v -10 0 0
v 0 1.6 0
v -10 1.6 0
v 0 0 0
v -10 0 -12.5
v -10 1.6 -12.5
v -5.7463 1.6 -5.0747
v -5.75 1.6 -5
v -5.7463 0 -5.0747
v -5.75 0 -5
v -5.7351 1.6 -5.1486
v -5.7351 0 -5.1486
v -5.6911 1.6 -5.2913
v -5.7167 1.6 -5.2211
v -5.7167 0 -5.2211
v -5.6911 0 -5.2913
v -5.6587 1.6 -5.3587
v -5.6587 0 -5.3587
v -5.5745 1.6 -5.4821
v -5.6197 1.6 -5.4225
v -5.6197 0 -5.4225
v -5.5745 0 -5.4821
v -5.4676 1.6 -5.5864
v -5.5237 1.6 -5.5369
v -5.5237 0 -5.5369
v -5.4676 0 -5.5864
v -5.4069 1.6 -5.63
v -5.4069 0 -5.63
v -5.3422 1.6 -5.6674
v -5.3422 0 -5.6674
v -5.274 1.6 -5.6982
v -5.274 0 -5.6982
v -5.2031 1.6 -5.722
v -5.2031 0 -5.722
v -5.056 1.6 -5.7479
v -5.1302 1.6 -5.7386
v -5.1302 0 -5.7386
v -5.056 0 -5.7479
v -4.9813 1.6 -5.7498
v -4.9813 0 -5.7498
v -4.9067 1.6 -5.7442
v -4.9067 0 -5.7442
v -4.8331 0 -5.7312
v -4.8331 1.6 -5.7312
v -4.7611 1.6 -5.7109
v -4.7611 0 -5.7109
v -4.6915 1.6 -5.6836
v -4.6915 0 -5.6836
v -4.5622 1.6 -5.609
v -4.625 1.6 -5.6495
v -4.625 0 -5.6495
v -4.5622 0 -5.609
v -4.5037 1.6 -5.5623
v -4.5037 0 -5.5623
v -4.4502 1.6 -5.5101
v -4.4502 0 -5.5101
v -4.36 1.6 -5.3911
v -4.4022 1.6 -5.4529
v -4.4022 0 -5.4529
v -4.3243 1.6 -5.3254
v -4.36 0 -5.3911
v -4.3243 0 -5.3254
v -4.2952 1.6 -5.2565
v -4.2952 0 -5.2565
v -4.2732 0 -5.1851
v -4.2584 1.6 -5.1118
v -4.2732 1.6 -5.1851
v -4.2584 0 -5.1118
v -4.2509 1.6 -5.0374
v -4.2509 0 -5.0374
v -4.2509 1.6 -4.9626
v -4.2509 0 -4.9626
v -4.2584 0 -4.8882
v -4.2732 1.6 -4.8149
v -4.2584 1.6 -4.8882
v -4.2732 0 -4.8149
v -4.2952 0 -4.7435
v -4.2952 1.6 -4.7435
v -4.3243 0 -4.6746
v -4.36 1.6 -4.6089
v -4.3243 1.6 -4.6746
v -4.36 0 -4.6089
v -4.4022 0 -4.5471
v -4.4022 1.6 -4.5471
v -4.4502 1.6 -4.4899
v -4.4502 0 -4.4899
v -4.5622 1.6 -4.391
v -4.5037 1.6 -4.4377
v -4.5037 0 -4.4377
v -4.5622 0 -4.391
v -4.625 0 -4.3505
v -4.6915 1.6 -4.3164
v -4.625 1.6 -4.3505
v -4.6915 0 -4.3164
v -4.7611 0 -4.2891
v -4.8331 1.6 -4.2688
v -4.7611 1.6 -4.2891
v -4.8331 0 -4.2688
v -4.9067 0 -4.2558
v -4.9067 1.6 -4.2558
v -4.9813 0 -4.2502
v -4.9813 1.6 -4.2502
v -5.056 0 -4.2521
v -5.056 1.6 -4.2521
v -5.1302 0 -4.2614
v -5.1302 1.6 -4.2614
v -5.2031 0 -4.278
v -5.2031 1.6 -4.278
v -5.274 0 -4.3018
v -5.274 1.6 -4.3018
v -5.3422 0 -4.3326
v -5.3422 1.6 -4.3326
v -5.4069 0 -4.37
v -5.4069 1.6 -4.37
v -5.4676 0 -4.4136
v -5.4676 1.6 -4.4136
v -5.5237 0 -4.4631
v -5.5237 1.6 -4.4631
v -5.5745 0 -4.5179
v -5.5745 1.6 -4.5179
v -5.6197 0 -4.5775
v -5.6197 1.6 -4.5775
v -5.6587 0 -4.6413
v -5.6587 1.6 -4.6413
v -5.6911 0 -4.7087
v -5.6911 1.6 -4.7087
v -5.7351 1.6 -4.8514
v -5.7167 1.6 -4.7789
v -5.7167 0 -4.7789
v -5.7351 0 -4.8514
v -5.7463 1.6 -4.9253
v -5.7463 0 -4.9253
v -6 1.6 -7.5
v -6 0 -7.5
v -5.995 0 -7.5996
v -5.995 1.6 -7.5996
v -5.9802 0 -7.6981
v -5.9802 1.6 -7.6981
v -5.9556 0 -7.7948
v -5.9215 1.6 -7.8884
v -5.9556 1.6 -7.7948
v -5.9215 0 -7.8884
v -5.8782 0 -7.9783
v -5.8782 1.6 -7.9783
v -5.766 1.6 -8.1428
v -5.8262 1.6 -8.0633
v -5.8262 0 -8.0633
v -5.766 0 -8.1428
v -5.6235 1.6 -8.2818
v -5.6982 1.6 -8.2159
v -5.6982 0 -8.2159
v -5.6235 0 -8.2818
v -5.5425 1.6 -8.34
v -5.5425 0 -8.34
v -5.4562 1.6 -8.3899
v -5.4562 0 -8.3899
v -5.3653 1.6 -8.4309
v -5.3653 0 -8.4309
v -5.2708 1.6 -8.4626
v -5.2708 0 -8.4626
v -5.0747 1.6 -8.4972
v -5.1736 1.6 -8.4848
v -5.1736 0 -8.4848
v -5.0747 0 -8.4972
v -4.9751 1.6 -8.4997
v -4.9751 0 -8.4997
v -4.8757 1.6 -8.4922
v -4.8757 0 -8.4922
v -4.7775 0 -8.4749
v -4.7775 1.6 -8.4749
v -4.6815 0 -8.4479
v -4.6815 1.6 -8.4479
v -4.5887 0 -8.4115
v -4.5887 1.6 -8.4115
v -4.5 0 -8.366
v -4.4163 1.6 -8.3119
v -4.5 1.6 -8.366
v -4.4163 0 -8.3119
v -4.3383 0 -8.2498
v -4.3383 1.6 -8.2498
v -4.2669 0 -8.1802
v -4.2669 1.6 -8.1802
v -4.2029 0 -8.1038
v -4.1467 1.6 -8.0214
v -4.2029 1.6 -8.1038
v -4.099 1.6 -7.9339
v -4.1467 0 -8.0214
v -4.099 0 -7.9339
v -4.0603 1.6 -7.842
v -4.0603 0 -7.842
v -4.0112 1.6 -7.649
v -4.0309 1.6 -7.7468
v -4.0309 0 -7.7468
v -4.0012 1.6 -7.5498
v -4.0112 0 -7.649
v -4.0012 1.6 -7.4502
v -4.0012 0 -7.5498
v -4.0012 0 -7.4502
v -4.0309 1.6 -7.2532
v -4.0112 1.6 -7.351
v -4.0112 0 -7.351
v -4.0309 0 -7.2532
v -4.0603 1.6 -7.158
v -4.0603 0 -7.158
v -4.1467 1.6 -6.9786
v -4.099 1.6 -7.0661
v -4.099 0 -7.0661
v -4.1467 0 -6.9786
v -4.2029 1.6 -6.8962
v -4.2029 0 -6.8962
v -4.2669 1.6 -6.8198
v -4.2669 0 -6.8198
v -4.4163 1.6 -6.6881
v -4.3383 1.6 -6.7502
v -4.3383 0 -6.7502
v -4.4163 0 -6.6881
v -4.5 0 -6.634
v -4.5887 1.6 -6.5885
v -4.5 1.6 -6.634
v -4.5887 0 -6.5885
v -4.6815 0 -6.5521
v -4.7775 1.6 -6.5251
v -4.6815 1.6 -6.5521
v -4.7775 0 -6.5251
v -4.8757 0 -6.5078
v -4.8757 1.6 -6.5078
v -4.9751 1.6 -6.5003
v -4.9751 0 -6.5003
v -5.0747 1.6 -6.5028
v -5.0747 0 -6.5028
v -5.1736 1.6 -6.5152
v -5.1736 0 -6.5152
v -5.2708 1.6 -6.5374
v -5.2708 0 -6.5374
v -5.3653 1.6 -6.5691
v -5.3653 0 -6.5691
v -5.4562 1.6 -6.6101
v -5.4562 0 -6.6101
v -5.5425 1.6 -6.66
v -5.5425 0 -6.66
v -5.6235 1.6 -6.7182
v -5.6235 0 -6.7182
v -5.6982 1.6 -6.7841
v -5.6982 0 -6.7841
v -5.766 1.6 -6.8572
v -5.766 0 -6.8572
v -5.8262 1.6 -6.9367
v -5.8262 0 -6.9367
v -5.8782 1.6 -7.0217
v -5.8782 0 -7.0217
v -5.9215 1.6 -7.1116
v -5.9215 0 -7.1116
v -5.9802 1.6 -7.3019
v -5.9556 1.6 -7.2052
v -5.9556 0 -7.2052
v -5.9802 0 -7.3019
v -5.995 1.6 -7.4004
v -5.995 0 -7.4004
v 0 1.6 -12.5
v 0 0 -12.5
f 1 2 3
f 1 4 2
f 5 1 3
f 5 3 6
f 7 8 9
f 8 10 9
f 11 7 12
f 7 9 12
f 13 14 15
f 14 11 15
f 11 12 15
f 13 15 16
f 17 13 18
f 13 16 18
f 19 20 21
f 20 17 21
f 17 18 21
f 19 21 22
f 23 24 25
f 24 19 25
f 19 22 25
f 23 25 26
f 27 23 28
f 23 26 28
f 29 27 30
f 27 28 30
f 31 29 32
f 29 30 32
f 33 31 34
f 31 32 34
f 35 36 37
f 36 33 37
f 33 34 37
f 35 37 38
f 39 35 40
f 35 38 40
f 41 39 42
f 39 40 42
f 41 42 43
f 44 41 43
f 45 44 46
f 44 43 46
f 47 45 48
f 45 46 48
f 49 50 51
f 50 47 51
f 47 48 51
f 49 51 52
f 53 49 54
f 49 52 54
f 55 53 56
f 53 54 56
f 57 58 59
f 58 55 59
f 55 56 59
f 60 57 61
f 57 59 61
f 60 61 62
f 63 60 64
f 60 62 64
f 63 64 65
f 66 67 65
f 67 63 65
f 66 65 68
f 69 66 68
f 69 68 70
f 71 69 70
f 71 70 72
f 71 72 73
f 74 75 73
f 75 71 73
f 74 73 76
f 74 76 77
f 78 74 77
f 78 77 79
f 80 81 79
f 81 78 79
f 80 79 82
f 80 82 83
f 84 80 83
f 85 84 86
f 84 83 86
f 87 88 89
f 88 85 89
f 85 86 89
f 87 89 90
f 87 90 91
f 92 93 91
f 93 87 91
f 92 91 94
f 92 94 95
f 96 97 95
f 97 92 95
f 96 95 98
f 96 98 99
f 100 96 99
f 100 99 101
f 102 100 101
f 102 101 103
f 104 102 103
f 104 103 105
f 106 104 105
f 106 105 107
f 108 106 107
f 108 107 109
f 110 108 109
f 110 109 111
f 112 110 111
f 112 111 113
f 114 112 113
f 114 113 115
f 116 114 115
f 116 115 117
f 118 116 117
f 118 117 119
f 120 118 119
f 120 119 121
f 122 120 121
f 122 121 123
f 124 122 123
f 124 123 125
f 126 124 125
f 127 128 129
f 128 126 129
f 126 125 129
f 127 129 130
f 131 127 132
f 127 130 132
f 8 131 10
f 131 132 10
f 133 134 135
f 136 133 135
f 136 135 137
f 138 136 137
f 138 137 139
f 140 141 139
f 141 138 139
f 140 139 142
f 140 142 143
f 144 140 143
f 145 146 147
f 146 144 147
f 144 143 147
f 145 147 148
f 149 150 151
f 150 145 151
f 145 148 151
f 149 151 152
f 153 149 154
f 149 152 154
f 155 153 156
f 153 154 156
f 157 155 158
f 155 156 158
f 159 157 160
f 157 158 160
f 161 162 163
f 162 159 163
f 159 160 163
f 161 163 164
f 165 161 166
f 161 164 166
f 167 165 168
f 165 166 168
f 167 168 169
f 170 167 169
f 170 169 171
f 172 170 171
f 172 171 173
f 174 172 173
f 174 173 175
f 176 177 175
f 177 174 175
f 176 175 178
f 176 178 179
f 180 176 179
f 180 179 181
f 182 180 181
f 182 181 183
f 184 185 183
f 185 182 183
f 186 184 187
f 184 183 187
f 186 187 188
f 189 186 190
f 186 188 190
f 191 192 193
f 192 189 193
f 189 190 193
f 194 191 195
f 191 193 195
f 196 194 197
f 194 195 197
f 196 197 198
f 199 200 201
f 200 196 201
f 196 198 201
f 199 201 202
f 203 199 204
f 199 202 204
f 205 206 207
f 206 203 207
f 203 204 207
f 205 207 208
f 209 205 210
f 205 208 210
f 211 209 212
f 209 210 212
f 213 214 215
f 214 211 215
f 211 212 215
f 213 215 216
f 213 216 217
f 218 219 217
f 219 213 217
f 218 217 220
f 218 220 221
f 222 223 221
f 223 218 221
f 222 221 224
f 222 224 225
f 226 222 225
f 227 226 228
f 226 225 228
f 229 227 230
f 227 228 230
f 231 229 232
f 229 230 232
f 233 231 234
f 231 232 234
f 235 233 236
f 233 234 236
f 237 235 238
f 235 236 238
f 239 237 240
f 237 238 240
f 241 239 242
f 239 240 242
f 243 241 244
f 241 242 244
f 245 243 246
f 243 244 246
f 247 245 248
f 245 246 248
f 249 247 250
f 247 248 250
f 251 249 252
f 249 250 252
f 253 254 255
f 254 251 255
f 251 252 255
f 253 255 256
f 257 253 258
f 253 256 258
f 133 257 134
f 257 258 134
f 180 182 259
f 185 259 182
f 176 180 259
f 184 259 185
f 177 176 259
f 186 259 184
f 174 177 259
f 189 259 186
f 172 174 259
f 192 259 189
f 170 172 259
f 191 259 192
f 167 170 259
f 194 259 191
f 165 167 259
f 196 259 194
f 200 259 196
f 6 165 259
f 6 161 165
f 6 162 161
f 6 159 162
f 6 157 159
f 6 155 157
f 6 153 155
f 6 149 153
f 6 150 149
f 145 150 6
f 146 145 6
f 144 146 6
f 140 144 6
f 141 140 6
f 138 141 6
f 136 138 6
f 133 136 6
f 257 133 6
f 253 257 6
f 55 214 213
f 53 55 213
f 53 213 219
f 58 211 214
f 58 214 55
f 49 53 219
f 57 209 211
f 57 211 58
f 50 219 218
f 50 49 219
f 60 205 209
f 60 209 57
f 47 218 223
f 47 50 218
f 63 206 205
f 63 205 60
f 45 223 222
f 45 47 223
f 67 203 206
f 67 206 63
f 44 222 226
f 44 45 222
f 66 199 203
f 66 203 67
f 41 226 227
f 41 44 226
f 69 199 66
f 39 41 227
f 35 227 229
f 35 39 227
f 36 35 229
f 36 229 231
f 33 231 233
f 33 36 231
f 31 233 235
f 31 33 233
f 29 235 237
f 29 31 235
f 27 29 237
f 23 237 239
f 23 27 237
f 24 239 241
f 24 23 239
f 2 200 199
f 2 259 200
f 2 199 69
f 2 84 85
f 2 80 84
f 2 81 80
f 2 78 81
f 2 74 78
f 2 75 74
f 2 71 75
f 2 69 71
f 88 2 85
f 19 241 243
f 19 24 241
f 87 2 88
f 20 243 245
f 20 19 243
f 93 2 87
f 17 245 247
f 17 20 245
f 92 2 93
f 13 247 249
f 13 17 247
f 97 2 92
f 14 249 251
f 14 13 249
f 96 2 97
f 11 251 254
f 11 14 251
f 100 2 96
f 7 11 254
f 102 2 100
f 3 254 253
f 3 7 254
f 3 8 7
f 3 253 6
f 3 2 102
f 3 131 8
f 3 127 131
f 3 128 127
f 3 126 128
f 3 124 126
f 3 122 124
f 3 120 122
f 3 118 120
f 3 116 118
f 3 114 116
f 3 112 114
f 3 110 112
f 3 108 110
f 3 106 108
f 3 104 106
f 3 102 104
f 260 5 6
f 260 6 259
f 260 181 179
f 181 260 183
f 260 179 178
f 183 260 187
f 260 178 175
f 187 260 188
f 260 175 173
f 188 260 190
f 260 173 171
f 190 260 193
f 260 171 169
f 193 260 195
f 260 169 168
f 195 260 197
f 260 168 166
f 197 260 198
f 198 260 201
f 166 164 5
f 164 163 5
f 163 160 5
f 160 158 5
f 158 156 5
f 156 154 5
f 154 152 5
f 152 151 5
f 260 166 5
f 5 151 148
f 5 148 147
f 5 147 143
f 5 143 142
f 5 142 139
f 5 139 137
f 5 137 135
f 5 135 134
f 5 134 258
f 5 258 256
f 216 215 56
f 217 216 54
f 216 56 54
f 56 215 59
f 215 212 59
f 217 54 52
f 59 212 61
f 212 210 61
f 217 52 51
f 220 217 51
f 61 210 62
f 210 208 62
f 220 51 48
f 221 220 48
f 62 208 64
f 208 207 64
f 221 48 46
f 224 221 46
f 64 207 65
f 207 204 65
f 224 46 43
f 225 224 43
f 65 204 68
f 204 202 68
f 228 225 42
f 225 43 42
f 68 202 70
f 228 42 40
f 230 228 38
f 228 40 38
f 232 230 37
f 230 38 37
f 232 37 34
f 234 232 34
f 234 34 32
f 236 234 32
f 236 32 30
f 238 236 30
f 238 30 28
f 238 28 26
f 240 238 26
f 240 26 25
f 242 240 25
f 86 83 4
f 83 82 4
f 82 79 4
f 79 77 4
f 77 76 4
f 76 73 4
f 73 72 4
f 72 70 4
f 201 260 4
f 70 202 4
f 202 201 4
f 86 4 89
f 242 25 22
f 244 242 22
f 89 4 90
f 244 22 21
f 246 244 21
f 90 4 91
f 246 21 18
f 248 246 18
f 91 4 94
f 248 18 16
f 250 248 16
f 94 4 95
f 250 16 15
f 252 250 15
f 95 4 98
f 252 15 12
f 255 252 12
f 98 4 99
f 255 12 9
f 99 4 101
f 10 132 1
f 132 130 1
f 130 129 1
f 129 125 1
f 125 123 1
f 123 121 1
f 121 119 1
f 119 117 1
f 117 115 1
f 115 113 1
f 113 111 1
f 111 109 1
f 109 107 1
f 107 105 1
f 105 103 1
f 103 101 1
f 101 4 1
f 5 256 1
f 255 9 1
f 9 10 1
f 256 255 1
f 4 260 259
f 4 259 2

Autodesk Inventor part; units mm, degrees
ref_plane "YZ Plane" through (0, 0, 0) normal (1, 0, 0) x (0, 1, 0)
ref_plane "XZ Plane" through (0, 0, 0) normal (0, 1, 0) x (-1, 0, 0)
ref_plane "XY Plane" through (0, 0, 0) normal (0, 0, 1) x (1, 0, 0)
sketch "Sketch1" plane through (0, 0, 0) normal (0, 1, 0) x (-1, 0, 0)
  line L0 (0, 0) -> (10, 0)
  line L1 (10, 0) -> (10, -12.5)
  line L2 (10, -12.5) -> (0, -12.5)
  line L3 (0, -12.5) -> (0, 0)
  line L4 (5, -3.5761) -> (5, -9.8666) construction
  circle A0 centre (5, -5) radius 0.75
  circle A1 centre (5, -7.5) radius 1
  dimension "d0" = 10
  dimension "d1" = 12.5
  dimension "d2" = 7.5
  dimension "d3" = 7.5
  dimension "d6" = 1.5
  dimension "d7" = 2
extrude "Extrusion1" add sketch "Sketch1" along normal blind 1.6
properties part number "Slit_insert"
